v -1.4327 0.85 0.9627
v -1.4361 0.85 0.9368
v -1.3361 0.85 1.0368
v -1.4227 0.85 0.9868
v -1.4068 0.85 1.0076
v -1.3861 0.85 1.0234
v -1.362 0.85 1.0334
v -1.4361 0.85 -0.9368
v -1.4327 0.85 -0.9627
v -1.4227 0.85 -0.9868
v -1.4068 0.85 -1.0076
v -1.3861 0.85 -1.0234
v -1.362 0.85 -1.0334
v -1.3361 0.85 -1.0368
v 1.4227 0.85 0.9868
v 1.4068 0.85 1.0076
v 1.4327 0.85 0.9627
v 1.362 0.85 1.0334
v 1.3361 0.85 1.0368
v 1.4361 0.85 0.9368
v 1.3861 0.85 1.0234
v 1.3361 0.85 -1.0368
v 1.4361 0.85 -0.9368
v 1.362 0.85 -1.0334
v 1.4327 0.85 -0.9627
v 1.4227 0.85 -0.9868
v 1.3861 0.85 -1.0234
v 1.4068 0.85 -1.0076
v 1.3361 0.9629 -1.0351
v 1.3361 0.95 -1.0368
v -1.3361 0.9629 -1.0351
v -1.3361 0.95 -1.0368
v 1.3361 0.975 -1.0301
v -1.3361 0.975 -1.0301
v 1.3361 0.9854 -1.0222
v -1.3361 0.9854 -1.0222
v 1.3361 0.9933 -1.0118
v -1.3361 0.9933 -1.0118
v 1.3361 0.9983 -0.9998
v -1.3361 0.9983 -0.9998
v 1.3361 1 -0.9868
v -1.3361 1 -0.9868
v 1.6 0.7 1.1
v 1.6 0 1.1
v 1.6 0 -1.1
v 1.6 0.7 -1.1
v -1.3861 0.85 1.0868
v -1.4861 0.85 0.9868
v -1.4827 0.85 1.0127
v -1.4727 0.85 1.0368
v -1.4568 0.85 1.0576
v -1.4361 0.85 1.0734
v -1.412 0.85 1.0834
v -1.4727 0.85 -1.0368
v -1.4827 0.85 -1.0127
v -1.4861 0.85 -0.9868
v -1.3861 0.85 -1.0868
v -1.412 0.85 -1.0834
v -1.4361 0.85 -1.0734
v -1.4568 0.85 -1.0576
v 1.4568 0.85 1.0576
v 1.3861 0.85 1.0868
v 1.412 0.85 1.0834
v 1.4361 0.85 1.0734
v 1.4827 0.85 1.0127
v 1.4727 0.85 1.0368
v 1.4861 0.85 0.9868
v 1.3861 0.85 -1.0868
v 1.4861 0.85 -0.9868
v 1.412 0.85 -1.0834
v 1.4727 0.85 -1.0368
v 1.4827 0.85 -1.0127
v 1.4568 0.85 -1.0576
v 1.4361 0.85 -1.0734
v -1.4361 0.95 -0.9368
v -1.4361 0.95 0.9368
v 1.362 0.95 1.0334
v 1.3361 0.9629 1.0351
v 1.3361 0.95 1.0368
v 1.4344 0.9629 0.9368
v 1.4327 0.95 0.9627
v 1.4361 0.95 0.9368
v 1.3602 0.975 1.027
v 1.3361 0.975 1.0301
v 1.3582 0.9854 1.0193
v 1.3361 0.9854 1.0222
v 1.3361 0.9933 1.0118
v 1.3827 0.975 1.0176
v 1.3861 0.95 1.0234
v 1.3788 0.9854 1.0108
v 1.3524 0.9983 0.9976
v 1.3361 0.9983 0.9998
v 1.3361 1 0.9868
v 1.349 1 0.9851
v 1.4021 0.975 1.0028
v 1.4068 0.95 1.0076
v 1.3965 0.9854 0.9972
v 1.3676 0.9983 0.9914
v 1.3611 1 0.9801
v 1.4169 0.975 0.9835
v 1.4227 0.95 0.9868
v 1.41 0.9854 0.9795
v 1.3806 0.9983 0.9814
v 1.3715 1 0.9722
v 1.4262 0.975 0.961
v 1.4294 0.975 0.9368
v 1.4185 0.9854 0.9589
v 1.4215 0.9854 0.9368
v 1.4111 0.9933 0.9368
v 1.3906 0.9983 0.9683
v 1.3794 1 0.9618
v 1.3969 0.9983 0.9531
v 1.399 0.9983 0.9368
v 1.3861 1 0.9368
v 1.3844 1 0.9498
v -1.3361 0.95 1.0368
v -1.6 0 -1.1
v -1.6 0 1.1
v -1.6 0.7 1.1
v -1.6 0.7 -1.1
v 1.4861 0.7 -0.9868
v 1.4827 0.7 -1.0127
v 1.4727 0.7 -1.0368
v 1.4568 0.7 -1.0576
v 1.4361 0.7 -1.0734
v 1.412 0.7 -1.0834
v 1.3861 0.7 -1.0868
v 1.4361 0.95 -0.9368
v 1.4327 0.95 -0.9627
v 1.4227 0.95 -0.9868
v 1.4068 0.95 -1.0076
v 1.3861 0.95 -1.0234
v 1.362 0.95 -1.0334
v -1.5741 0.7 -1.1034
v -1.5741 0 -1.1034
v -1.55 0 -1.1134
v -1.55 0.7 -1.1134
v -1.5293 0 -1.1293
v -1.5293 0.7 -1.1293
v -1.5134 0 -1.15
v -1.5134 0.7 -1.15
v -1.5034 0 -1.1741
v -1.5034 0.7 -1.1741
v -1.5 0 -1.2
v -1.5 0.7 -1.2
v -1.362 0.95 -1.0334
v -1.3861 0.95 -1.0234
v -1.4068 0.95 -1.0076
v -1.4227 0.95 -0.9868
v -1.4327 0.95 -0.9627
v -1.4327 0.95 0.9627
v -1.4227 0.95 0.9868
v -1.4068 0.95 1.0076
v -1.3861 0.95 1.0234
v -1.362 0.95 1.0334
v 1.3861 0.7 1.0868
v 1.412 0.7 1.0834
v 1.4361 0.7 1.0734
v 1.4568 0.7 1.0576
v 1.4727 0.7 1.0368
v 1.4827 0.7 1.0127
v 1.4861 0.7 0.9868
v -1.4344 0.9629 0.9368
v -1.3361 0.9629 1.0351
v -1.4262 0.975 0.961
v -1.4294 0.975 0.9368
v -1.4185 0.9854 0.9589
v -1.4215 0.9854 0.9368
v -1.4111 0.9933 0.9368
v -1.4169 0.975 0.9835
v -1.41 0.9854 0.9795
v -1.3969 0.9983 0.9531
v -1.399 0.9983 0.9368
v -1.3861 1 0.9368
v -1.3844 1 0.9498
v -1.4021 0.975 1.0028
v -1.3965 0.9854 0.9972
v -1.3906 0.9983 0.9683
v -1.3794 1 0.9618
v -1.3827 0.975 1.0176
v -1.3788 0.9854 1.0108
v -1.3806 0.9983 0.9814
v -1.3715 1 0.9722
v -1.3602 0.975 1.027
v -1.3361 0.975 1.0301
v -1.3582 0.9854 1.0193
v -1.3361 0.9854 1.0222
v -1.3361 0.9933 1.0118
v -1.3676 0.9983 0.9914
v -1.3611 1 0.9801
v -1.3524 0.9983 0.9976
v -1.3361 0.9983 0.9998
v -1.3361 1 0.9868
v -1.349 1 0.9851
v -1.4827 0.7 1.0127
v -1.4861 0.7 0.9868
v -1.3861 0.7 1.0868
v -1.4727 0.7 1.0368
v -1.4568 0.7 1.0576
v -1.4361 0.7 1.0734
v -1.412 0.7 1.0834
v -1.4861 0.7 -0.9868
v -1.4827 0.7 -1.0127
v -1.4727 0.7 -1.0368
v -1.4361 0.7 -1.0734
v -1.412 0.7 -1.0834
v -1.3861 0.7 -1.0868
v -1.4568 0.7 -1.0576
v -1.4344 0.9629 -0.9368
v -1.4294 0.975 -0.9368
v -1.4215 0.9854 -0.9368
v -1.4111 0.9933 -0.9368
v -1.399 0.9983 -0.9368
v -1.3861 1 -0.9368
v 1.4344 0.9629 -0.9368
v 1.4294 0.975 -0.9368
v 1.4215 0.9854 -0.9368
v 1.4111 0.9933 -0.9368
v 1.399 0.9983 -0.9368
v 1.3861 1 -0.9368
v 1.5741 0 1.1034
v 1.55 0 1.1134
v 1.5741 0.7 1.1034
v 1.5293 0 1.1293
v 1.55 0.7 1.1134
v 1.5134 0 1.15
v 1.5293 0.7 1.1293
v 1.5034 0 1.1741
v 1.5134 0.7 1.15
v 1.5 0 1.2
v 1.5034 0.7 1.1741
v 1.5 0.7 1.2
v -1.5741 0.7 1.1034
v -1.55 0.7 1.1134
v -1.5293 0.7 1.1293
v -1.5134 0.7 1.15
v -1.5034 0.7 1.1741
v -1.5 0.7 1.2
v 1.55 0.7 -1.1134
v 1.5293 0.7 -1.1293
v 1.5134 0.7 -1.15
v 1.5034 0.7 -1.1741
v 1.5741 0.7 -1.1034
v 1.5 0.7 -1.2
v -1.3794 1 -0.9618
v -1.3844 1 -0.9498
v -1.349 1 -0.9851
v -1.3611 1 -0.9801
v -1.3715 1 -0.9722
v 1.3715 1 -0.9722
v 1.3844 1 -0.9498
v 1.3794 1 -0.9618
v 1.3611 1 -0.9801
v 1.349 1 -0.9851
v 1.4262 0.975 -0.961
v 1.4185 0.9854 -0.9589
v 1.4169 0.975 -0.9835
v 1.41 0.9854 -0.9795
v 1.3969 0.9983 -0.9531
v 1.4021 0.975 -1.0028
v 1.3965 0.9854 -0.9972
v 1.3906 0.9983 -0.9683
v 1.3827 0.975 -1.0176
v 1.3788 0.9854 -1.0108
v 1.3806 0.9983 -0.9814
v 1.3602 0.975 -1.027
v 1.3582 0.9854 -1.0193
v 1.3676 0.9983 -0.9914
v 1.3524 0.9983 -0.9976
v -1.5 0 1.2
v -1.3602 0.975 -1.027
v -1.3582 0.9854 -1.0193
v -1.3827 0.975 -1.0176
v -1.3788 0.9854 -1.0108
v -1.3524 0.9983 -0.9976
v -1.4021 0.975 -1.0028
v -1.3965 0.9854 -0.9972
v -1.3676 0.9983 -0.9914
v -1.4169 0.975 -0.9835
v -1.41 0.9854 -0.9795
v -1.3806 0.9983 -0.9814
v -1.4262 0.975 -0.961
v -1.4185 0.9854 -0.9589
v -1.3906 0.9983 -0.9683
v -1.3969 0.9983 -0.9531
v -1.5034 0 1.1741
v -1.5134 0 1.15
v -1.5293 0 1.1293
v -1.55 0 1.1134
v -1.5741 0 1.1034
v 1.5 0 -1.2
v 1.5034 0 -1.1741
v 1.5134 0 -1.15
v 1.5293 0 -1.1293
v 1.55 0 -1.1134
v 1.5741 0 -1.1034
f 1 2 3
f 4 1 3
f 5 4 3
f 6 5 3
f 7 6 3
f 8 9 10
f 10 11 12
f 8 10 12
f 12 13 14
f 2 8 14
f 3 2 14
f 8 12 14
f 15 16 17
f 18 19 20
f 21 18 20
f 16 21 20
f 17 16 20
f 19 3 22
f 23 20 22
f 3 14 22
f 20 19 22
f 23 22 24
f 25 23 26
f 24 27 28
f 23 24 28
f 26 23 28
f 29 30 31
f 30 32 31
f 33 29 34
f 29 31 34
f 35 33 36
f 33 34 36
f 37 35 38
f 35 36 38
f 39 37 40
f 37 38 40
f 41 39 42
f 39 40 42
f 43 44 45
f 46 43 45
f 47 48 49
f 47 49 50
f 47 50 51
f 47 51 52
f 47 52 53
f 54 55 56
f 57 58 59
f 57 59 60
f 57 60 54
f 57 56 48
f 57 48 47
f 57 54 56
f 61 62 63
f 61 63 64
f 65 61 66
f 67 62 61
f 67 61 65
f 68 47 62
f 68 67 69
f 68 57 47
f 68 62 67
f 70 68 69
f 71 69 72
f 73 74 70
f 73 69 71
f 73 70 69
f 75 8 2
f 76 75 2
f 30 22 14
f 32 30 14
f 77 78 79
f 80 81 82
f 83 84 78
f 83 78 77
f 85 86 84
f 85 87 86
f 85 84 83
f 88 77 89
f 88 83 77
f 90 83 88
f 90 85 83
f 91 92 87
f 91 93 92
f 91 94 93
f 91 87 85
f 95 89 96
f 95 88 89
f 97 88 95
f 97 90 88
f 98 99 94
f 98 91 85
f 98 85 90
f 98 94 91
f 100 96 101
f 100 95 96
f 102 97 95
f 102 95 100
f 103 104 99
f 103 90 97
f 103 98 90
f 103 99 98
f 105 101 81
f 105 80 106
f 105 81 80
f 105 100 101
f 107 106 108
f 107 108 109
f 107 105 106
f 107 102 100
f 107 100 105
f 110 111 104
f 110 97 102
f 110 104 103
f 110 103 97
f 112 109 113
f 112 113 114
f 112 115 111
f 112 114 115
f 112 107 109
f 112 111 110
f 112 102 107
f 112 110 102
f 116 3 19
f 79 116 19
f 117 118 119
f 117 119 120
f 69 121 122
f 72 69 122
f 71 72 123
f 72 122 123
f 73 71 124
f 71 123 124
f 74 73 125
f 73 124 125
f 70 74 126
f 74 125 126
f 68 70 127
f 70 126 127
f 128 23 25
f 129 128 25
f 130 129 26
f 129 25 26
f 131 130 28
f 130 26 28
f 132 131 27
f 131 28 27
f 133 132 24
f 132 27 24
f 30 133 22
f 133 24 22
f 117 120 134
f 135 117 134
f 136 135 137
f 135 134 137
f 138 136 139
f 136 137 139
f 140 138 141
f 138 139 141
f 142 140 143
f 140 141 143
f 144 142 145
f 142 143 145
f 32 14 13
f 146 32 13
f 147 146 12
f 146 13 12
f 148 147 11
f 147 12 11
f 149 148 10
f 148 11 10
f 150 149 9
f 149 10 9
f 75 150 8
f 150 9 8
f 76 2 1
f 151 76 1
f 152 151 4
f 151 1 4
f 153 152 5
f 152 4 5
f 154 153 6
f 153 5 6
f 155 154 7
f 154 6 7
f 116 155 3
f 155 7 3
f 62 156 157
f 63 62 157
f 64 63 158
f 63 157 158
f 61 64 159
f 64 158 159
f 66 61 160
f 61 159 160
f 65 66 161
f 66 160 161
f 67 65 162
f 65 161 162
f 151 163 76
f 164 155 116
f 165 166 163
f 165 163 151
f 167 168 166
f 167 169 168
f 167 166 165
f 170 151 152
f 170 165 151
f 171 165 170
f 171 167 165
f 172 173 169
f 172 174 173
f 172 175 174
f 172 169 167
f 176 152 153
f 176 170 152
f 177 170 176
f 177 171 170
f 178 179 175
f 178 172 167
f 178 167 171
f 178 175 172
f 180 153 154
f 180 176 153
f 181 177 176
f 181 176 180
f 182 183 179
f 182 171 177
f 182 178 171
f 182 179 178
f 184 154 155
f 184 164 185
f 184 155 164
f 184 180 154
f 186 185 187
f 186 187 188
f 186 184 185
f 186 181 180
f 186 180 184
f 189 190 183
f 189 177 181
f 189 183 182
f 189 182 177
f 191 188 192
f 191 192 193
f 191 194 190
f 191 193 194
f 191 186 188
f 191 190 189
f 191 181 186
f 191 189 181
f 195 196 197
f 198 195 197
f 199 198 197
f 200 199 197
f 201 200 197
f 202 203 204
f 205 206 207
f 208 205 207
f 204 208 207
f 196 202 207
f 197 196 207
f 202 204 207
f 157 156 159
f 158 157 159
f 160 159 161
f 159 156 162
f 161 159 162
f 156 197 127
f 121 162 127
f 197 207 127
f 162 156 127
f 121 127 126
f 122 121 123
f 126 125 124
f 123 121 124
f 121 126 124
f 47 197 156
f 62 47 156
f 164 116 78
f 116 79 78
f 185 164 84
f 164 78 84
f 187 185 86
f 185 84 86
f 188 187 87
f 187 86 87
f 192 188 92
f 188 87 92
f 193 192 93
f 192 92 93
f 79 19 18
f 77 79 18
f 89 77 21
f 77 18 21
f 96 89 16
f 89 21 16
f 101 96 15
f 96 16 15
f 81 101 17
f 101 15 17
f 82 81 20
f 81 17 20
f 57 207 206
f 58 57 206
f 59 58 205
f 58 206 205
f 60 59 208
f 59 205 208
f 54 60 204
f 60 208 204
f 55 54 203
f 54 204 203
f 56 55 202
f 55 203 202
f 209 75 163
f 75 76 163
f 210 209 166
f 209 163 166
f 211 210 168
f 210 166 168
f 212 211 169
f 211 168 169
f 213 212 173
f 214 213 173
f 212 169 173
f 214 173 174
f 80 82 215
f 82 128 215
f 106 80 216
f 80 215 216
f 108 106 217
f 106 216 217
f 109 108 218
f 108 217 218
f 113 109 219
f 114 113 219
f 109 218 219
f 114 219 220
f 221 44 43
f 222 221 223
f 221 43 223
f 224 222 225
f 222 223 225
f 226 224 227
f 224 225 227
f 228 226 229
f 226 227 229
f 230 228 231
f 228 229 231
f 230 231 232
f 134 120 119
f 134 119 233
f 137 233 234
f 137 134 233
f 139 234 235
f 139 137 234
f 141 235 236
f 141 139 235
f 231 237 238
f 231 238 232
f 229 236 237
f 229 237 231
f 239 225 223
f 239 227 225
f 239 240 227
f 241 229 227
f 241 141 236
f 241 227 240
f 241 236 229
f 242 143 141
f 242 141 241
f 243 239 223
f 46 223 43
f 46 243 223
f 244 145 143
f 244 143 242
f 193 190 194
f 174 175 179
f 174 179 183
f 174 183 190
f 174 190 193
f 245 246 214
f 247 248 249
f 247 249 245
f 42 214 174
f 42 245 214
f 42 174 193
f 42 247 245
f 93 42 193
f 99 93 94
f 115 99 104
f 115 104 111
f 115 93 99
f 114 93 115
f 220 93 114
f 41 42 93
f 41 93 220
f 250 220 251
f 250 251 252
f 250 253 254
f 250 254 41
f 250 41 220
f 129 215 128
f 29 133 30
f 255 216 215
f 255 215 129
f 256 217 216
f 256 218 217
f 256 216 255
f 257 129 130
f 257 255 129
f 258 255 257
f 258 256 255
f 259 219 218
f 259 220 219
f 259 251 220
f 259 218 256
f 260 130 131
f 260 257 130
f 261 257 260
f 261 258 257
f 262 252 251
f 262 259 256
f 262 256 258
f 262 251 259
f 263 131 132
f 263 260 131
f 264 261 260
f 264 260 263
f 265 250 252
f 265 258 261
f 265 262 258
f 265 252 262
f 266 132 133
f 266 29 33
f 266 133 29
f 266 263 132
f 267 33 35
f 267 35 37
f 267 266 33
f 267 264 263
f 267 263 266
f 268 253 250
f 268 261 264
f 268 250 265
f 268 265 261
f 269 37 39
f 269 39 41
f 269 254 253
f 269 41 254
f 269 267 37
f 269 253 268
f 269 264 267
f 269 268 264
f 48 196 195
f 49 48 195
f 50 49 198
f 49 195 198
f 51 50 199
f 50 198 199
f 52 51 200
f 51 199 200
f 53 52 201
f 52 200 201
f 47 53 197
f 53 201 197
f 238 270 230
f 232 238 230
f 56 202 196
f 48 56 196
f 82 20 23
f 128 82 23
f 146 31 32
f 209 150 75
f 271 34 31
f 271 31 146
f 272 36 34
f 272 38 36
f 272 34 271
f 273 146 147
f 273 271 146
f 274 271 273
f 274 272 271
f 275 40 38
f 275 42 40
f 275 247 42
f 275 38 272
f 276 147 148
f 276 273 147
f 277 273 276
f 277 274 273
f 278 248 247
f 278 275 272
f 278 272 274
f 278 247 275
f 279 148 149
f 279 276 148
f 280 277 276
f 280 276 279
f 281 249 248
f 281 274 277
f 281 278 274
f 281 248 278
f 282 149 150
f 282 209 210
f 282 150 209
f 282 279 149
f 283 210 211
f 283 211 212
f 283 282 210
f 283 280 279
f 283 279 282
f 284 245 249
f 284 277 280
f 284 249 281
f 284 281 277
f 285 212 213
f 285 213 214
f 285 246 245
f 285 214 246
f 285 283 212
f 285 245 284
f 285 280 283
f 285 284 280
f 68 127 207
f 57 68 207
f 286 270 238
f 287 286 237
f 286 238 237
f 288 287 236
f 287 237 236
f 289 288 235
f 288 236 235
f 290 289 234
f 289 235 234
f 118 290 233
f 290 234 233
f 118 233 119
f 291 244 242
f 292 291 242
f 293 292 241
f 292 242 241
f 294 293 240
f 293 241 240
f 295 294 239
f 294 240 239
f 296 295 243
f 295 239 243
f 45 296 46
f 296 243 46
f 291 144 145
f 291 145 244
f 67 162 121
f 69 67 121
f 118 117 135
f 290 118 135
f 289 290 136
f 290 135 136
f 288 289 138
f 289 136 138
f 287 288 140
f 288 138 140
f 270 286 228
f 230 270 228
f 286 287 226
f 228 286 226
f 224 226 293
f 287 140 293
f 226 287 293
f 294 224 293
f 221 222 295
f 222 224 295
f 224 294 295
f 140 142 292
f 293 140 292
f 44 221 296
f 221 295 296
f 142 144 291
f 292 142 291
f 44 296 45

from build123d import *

# Parameters (mm, degrees)
SKETCH1_W           = 3.2
SKETCH1_H           = 2.4
BOSS_EXTRUDE1_DEPTH = 0.7
SKETCH2_R           = 0.1
CUT_EXTRUDE1_DEPTH  = 1.7
BOSS_EXTRUDE2_DEPTH = 0.15
BOSS_EXTRUDE3_DEPTH = 0.15
FILLET1_R           = 0.05


with BuildPart() as part:
    # Sketch1 → Boss-Extrude1 (new body)
    with BuildSketch(Plane(origin=(0, 0, 0), x_dir=(1, 0, 0), z_dir=(0, 1, 0))):
        Rectangle(SKETCH1_W, SKETCH1_H)
    extrude(amount=BOSS_EXTRUDE1_DEPTH)

    # Sketch2 → Cut-Extrude1 (cut, through all)
    with BuildSketch(Plane(origin=(0, 0.7, 0), x_dir=(1, 0, 0), z_dir=(0, 1, 0))):
        with Locations((-1.6, 1.2)):
            Circle(SKETCH2_R)
        with Locations((1.6, 1.2)):
            Circle(SKETCH2_R)
        with Locations((1.6, -1.2)):
            Circle(SKETCH2_R)
        with Locations((-1.6, -1.2)):
            Circle(SKETCH2_R)
    extrude(amount=-CUT_EXTRUDE1_DEPTH, mode=Mode.SUBTRACT)


with BuildPart() as body_2:
    # Sketch3 → Boss-Extrude2 (new body)
    with BuildSketch(Plane(origin=(0, 0.7, 0), x_dir=(1, 0, 0), z_dir=(0, 1, 0))):
        with BuildLine():
            Line((-1.386096781, -1.0868469), (1.386096781, -1.0868469))
            ThreePointArc((1.386096781, -1.0868469), (1.456807459, -1.057557578), (1.486096781, -0.9868469))
            Line((1.486096781, -0.9868469), (1.486096781, 0.9868469))
            ThreePointArc((1.486096781, 0.9868469), (1.456807459, 1.057557578), (1.386096781, 1.0868469))
            Line((1.386096781, 1.0868469), (-1.386096781, 1.0868469))
            ThreePointArc((-1.386096781, 1.0868469), (-1.456807459, 1.057557578), (-1.486096781, 0.9868469))
            Line((-1.486096781, 0.9868469), (-1.486096781, -0.9868469))
            ThreePointArc((-1.486096781, -0.9868469), (-1.456807459, -1.057557578), (-1.386096781, -1.0868469))
        make_face()
    extrude(amount=BOSS_EXTRUDE2_DEPTH)


with BuildPart() as body_3:
    # Sketch4 → Boss-Extrude3 (new body)
    with BuildSketch(Plane(origin=(0, 0.85, 0), x_dir=(1, 0, 0), z_dir=(0, 1, 0))):
        with BuildLine():
            Line((-1.336096781, -1.0368469), (1.336096781, -1.0368469))
            ThreePointArc((1.336096781, -1.0368469), (1.406807459, -1.007557578), (1.436096781, -0.9368469))
            Line((1.436096781, -0.9368469), (1.436096781, 0.9368469))
            ThreePointArc((1.436096781, 0.9368469), (1.406807459, 1.007557578), (1.336096781, 1.0368469))
            Line((1.336096781, 1.0368469), (-1.336096781, 1.0368469))
            ThreePointArc((-1.336096781, 1.0368469), (-1.406807459, 1.007557578), (-1.436096781, 0.9368469))
            Line((-1.436096781, 0.9368469), (-1.436096781, -0.9368469))
            ThreePointArc((-1.436096781, -0.9368469), (-1.406807459, -1.007557578), (-1.336096781, -1.0368469))
        make_face()
    extrude(amount=BOSS_EXTRUDE3_DEPTH)

    # Fillet1
    fillet1_edges = [body_3.edges().sort_by_distance(p)[0] for p in [
        (1.406807459, 1, 1.007557578),
        (1.436096781, 1, 0),
        (1.406807459, 1, -1.007557578),
        (0, 1, -1.0368469),
        (-1.406807459, 1, -1.007557578),
        (-1.436096781, 1, 0),
        (-1.406807459, 1, 1.007557578),
        (0, 1, 1.0368469),
    ]]
    fillet(fillet1_edges, radius=FILLET1_R)


solid = Compound([part.part, body_2.part, body_3.part])
